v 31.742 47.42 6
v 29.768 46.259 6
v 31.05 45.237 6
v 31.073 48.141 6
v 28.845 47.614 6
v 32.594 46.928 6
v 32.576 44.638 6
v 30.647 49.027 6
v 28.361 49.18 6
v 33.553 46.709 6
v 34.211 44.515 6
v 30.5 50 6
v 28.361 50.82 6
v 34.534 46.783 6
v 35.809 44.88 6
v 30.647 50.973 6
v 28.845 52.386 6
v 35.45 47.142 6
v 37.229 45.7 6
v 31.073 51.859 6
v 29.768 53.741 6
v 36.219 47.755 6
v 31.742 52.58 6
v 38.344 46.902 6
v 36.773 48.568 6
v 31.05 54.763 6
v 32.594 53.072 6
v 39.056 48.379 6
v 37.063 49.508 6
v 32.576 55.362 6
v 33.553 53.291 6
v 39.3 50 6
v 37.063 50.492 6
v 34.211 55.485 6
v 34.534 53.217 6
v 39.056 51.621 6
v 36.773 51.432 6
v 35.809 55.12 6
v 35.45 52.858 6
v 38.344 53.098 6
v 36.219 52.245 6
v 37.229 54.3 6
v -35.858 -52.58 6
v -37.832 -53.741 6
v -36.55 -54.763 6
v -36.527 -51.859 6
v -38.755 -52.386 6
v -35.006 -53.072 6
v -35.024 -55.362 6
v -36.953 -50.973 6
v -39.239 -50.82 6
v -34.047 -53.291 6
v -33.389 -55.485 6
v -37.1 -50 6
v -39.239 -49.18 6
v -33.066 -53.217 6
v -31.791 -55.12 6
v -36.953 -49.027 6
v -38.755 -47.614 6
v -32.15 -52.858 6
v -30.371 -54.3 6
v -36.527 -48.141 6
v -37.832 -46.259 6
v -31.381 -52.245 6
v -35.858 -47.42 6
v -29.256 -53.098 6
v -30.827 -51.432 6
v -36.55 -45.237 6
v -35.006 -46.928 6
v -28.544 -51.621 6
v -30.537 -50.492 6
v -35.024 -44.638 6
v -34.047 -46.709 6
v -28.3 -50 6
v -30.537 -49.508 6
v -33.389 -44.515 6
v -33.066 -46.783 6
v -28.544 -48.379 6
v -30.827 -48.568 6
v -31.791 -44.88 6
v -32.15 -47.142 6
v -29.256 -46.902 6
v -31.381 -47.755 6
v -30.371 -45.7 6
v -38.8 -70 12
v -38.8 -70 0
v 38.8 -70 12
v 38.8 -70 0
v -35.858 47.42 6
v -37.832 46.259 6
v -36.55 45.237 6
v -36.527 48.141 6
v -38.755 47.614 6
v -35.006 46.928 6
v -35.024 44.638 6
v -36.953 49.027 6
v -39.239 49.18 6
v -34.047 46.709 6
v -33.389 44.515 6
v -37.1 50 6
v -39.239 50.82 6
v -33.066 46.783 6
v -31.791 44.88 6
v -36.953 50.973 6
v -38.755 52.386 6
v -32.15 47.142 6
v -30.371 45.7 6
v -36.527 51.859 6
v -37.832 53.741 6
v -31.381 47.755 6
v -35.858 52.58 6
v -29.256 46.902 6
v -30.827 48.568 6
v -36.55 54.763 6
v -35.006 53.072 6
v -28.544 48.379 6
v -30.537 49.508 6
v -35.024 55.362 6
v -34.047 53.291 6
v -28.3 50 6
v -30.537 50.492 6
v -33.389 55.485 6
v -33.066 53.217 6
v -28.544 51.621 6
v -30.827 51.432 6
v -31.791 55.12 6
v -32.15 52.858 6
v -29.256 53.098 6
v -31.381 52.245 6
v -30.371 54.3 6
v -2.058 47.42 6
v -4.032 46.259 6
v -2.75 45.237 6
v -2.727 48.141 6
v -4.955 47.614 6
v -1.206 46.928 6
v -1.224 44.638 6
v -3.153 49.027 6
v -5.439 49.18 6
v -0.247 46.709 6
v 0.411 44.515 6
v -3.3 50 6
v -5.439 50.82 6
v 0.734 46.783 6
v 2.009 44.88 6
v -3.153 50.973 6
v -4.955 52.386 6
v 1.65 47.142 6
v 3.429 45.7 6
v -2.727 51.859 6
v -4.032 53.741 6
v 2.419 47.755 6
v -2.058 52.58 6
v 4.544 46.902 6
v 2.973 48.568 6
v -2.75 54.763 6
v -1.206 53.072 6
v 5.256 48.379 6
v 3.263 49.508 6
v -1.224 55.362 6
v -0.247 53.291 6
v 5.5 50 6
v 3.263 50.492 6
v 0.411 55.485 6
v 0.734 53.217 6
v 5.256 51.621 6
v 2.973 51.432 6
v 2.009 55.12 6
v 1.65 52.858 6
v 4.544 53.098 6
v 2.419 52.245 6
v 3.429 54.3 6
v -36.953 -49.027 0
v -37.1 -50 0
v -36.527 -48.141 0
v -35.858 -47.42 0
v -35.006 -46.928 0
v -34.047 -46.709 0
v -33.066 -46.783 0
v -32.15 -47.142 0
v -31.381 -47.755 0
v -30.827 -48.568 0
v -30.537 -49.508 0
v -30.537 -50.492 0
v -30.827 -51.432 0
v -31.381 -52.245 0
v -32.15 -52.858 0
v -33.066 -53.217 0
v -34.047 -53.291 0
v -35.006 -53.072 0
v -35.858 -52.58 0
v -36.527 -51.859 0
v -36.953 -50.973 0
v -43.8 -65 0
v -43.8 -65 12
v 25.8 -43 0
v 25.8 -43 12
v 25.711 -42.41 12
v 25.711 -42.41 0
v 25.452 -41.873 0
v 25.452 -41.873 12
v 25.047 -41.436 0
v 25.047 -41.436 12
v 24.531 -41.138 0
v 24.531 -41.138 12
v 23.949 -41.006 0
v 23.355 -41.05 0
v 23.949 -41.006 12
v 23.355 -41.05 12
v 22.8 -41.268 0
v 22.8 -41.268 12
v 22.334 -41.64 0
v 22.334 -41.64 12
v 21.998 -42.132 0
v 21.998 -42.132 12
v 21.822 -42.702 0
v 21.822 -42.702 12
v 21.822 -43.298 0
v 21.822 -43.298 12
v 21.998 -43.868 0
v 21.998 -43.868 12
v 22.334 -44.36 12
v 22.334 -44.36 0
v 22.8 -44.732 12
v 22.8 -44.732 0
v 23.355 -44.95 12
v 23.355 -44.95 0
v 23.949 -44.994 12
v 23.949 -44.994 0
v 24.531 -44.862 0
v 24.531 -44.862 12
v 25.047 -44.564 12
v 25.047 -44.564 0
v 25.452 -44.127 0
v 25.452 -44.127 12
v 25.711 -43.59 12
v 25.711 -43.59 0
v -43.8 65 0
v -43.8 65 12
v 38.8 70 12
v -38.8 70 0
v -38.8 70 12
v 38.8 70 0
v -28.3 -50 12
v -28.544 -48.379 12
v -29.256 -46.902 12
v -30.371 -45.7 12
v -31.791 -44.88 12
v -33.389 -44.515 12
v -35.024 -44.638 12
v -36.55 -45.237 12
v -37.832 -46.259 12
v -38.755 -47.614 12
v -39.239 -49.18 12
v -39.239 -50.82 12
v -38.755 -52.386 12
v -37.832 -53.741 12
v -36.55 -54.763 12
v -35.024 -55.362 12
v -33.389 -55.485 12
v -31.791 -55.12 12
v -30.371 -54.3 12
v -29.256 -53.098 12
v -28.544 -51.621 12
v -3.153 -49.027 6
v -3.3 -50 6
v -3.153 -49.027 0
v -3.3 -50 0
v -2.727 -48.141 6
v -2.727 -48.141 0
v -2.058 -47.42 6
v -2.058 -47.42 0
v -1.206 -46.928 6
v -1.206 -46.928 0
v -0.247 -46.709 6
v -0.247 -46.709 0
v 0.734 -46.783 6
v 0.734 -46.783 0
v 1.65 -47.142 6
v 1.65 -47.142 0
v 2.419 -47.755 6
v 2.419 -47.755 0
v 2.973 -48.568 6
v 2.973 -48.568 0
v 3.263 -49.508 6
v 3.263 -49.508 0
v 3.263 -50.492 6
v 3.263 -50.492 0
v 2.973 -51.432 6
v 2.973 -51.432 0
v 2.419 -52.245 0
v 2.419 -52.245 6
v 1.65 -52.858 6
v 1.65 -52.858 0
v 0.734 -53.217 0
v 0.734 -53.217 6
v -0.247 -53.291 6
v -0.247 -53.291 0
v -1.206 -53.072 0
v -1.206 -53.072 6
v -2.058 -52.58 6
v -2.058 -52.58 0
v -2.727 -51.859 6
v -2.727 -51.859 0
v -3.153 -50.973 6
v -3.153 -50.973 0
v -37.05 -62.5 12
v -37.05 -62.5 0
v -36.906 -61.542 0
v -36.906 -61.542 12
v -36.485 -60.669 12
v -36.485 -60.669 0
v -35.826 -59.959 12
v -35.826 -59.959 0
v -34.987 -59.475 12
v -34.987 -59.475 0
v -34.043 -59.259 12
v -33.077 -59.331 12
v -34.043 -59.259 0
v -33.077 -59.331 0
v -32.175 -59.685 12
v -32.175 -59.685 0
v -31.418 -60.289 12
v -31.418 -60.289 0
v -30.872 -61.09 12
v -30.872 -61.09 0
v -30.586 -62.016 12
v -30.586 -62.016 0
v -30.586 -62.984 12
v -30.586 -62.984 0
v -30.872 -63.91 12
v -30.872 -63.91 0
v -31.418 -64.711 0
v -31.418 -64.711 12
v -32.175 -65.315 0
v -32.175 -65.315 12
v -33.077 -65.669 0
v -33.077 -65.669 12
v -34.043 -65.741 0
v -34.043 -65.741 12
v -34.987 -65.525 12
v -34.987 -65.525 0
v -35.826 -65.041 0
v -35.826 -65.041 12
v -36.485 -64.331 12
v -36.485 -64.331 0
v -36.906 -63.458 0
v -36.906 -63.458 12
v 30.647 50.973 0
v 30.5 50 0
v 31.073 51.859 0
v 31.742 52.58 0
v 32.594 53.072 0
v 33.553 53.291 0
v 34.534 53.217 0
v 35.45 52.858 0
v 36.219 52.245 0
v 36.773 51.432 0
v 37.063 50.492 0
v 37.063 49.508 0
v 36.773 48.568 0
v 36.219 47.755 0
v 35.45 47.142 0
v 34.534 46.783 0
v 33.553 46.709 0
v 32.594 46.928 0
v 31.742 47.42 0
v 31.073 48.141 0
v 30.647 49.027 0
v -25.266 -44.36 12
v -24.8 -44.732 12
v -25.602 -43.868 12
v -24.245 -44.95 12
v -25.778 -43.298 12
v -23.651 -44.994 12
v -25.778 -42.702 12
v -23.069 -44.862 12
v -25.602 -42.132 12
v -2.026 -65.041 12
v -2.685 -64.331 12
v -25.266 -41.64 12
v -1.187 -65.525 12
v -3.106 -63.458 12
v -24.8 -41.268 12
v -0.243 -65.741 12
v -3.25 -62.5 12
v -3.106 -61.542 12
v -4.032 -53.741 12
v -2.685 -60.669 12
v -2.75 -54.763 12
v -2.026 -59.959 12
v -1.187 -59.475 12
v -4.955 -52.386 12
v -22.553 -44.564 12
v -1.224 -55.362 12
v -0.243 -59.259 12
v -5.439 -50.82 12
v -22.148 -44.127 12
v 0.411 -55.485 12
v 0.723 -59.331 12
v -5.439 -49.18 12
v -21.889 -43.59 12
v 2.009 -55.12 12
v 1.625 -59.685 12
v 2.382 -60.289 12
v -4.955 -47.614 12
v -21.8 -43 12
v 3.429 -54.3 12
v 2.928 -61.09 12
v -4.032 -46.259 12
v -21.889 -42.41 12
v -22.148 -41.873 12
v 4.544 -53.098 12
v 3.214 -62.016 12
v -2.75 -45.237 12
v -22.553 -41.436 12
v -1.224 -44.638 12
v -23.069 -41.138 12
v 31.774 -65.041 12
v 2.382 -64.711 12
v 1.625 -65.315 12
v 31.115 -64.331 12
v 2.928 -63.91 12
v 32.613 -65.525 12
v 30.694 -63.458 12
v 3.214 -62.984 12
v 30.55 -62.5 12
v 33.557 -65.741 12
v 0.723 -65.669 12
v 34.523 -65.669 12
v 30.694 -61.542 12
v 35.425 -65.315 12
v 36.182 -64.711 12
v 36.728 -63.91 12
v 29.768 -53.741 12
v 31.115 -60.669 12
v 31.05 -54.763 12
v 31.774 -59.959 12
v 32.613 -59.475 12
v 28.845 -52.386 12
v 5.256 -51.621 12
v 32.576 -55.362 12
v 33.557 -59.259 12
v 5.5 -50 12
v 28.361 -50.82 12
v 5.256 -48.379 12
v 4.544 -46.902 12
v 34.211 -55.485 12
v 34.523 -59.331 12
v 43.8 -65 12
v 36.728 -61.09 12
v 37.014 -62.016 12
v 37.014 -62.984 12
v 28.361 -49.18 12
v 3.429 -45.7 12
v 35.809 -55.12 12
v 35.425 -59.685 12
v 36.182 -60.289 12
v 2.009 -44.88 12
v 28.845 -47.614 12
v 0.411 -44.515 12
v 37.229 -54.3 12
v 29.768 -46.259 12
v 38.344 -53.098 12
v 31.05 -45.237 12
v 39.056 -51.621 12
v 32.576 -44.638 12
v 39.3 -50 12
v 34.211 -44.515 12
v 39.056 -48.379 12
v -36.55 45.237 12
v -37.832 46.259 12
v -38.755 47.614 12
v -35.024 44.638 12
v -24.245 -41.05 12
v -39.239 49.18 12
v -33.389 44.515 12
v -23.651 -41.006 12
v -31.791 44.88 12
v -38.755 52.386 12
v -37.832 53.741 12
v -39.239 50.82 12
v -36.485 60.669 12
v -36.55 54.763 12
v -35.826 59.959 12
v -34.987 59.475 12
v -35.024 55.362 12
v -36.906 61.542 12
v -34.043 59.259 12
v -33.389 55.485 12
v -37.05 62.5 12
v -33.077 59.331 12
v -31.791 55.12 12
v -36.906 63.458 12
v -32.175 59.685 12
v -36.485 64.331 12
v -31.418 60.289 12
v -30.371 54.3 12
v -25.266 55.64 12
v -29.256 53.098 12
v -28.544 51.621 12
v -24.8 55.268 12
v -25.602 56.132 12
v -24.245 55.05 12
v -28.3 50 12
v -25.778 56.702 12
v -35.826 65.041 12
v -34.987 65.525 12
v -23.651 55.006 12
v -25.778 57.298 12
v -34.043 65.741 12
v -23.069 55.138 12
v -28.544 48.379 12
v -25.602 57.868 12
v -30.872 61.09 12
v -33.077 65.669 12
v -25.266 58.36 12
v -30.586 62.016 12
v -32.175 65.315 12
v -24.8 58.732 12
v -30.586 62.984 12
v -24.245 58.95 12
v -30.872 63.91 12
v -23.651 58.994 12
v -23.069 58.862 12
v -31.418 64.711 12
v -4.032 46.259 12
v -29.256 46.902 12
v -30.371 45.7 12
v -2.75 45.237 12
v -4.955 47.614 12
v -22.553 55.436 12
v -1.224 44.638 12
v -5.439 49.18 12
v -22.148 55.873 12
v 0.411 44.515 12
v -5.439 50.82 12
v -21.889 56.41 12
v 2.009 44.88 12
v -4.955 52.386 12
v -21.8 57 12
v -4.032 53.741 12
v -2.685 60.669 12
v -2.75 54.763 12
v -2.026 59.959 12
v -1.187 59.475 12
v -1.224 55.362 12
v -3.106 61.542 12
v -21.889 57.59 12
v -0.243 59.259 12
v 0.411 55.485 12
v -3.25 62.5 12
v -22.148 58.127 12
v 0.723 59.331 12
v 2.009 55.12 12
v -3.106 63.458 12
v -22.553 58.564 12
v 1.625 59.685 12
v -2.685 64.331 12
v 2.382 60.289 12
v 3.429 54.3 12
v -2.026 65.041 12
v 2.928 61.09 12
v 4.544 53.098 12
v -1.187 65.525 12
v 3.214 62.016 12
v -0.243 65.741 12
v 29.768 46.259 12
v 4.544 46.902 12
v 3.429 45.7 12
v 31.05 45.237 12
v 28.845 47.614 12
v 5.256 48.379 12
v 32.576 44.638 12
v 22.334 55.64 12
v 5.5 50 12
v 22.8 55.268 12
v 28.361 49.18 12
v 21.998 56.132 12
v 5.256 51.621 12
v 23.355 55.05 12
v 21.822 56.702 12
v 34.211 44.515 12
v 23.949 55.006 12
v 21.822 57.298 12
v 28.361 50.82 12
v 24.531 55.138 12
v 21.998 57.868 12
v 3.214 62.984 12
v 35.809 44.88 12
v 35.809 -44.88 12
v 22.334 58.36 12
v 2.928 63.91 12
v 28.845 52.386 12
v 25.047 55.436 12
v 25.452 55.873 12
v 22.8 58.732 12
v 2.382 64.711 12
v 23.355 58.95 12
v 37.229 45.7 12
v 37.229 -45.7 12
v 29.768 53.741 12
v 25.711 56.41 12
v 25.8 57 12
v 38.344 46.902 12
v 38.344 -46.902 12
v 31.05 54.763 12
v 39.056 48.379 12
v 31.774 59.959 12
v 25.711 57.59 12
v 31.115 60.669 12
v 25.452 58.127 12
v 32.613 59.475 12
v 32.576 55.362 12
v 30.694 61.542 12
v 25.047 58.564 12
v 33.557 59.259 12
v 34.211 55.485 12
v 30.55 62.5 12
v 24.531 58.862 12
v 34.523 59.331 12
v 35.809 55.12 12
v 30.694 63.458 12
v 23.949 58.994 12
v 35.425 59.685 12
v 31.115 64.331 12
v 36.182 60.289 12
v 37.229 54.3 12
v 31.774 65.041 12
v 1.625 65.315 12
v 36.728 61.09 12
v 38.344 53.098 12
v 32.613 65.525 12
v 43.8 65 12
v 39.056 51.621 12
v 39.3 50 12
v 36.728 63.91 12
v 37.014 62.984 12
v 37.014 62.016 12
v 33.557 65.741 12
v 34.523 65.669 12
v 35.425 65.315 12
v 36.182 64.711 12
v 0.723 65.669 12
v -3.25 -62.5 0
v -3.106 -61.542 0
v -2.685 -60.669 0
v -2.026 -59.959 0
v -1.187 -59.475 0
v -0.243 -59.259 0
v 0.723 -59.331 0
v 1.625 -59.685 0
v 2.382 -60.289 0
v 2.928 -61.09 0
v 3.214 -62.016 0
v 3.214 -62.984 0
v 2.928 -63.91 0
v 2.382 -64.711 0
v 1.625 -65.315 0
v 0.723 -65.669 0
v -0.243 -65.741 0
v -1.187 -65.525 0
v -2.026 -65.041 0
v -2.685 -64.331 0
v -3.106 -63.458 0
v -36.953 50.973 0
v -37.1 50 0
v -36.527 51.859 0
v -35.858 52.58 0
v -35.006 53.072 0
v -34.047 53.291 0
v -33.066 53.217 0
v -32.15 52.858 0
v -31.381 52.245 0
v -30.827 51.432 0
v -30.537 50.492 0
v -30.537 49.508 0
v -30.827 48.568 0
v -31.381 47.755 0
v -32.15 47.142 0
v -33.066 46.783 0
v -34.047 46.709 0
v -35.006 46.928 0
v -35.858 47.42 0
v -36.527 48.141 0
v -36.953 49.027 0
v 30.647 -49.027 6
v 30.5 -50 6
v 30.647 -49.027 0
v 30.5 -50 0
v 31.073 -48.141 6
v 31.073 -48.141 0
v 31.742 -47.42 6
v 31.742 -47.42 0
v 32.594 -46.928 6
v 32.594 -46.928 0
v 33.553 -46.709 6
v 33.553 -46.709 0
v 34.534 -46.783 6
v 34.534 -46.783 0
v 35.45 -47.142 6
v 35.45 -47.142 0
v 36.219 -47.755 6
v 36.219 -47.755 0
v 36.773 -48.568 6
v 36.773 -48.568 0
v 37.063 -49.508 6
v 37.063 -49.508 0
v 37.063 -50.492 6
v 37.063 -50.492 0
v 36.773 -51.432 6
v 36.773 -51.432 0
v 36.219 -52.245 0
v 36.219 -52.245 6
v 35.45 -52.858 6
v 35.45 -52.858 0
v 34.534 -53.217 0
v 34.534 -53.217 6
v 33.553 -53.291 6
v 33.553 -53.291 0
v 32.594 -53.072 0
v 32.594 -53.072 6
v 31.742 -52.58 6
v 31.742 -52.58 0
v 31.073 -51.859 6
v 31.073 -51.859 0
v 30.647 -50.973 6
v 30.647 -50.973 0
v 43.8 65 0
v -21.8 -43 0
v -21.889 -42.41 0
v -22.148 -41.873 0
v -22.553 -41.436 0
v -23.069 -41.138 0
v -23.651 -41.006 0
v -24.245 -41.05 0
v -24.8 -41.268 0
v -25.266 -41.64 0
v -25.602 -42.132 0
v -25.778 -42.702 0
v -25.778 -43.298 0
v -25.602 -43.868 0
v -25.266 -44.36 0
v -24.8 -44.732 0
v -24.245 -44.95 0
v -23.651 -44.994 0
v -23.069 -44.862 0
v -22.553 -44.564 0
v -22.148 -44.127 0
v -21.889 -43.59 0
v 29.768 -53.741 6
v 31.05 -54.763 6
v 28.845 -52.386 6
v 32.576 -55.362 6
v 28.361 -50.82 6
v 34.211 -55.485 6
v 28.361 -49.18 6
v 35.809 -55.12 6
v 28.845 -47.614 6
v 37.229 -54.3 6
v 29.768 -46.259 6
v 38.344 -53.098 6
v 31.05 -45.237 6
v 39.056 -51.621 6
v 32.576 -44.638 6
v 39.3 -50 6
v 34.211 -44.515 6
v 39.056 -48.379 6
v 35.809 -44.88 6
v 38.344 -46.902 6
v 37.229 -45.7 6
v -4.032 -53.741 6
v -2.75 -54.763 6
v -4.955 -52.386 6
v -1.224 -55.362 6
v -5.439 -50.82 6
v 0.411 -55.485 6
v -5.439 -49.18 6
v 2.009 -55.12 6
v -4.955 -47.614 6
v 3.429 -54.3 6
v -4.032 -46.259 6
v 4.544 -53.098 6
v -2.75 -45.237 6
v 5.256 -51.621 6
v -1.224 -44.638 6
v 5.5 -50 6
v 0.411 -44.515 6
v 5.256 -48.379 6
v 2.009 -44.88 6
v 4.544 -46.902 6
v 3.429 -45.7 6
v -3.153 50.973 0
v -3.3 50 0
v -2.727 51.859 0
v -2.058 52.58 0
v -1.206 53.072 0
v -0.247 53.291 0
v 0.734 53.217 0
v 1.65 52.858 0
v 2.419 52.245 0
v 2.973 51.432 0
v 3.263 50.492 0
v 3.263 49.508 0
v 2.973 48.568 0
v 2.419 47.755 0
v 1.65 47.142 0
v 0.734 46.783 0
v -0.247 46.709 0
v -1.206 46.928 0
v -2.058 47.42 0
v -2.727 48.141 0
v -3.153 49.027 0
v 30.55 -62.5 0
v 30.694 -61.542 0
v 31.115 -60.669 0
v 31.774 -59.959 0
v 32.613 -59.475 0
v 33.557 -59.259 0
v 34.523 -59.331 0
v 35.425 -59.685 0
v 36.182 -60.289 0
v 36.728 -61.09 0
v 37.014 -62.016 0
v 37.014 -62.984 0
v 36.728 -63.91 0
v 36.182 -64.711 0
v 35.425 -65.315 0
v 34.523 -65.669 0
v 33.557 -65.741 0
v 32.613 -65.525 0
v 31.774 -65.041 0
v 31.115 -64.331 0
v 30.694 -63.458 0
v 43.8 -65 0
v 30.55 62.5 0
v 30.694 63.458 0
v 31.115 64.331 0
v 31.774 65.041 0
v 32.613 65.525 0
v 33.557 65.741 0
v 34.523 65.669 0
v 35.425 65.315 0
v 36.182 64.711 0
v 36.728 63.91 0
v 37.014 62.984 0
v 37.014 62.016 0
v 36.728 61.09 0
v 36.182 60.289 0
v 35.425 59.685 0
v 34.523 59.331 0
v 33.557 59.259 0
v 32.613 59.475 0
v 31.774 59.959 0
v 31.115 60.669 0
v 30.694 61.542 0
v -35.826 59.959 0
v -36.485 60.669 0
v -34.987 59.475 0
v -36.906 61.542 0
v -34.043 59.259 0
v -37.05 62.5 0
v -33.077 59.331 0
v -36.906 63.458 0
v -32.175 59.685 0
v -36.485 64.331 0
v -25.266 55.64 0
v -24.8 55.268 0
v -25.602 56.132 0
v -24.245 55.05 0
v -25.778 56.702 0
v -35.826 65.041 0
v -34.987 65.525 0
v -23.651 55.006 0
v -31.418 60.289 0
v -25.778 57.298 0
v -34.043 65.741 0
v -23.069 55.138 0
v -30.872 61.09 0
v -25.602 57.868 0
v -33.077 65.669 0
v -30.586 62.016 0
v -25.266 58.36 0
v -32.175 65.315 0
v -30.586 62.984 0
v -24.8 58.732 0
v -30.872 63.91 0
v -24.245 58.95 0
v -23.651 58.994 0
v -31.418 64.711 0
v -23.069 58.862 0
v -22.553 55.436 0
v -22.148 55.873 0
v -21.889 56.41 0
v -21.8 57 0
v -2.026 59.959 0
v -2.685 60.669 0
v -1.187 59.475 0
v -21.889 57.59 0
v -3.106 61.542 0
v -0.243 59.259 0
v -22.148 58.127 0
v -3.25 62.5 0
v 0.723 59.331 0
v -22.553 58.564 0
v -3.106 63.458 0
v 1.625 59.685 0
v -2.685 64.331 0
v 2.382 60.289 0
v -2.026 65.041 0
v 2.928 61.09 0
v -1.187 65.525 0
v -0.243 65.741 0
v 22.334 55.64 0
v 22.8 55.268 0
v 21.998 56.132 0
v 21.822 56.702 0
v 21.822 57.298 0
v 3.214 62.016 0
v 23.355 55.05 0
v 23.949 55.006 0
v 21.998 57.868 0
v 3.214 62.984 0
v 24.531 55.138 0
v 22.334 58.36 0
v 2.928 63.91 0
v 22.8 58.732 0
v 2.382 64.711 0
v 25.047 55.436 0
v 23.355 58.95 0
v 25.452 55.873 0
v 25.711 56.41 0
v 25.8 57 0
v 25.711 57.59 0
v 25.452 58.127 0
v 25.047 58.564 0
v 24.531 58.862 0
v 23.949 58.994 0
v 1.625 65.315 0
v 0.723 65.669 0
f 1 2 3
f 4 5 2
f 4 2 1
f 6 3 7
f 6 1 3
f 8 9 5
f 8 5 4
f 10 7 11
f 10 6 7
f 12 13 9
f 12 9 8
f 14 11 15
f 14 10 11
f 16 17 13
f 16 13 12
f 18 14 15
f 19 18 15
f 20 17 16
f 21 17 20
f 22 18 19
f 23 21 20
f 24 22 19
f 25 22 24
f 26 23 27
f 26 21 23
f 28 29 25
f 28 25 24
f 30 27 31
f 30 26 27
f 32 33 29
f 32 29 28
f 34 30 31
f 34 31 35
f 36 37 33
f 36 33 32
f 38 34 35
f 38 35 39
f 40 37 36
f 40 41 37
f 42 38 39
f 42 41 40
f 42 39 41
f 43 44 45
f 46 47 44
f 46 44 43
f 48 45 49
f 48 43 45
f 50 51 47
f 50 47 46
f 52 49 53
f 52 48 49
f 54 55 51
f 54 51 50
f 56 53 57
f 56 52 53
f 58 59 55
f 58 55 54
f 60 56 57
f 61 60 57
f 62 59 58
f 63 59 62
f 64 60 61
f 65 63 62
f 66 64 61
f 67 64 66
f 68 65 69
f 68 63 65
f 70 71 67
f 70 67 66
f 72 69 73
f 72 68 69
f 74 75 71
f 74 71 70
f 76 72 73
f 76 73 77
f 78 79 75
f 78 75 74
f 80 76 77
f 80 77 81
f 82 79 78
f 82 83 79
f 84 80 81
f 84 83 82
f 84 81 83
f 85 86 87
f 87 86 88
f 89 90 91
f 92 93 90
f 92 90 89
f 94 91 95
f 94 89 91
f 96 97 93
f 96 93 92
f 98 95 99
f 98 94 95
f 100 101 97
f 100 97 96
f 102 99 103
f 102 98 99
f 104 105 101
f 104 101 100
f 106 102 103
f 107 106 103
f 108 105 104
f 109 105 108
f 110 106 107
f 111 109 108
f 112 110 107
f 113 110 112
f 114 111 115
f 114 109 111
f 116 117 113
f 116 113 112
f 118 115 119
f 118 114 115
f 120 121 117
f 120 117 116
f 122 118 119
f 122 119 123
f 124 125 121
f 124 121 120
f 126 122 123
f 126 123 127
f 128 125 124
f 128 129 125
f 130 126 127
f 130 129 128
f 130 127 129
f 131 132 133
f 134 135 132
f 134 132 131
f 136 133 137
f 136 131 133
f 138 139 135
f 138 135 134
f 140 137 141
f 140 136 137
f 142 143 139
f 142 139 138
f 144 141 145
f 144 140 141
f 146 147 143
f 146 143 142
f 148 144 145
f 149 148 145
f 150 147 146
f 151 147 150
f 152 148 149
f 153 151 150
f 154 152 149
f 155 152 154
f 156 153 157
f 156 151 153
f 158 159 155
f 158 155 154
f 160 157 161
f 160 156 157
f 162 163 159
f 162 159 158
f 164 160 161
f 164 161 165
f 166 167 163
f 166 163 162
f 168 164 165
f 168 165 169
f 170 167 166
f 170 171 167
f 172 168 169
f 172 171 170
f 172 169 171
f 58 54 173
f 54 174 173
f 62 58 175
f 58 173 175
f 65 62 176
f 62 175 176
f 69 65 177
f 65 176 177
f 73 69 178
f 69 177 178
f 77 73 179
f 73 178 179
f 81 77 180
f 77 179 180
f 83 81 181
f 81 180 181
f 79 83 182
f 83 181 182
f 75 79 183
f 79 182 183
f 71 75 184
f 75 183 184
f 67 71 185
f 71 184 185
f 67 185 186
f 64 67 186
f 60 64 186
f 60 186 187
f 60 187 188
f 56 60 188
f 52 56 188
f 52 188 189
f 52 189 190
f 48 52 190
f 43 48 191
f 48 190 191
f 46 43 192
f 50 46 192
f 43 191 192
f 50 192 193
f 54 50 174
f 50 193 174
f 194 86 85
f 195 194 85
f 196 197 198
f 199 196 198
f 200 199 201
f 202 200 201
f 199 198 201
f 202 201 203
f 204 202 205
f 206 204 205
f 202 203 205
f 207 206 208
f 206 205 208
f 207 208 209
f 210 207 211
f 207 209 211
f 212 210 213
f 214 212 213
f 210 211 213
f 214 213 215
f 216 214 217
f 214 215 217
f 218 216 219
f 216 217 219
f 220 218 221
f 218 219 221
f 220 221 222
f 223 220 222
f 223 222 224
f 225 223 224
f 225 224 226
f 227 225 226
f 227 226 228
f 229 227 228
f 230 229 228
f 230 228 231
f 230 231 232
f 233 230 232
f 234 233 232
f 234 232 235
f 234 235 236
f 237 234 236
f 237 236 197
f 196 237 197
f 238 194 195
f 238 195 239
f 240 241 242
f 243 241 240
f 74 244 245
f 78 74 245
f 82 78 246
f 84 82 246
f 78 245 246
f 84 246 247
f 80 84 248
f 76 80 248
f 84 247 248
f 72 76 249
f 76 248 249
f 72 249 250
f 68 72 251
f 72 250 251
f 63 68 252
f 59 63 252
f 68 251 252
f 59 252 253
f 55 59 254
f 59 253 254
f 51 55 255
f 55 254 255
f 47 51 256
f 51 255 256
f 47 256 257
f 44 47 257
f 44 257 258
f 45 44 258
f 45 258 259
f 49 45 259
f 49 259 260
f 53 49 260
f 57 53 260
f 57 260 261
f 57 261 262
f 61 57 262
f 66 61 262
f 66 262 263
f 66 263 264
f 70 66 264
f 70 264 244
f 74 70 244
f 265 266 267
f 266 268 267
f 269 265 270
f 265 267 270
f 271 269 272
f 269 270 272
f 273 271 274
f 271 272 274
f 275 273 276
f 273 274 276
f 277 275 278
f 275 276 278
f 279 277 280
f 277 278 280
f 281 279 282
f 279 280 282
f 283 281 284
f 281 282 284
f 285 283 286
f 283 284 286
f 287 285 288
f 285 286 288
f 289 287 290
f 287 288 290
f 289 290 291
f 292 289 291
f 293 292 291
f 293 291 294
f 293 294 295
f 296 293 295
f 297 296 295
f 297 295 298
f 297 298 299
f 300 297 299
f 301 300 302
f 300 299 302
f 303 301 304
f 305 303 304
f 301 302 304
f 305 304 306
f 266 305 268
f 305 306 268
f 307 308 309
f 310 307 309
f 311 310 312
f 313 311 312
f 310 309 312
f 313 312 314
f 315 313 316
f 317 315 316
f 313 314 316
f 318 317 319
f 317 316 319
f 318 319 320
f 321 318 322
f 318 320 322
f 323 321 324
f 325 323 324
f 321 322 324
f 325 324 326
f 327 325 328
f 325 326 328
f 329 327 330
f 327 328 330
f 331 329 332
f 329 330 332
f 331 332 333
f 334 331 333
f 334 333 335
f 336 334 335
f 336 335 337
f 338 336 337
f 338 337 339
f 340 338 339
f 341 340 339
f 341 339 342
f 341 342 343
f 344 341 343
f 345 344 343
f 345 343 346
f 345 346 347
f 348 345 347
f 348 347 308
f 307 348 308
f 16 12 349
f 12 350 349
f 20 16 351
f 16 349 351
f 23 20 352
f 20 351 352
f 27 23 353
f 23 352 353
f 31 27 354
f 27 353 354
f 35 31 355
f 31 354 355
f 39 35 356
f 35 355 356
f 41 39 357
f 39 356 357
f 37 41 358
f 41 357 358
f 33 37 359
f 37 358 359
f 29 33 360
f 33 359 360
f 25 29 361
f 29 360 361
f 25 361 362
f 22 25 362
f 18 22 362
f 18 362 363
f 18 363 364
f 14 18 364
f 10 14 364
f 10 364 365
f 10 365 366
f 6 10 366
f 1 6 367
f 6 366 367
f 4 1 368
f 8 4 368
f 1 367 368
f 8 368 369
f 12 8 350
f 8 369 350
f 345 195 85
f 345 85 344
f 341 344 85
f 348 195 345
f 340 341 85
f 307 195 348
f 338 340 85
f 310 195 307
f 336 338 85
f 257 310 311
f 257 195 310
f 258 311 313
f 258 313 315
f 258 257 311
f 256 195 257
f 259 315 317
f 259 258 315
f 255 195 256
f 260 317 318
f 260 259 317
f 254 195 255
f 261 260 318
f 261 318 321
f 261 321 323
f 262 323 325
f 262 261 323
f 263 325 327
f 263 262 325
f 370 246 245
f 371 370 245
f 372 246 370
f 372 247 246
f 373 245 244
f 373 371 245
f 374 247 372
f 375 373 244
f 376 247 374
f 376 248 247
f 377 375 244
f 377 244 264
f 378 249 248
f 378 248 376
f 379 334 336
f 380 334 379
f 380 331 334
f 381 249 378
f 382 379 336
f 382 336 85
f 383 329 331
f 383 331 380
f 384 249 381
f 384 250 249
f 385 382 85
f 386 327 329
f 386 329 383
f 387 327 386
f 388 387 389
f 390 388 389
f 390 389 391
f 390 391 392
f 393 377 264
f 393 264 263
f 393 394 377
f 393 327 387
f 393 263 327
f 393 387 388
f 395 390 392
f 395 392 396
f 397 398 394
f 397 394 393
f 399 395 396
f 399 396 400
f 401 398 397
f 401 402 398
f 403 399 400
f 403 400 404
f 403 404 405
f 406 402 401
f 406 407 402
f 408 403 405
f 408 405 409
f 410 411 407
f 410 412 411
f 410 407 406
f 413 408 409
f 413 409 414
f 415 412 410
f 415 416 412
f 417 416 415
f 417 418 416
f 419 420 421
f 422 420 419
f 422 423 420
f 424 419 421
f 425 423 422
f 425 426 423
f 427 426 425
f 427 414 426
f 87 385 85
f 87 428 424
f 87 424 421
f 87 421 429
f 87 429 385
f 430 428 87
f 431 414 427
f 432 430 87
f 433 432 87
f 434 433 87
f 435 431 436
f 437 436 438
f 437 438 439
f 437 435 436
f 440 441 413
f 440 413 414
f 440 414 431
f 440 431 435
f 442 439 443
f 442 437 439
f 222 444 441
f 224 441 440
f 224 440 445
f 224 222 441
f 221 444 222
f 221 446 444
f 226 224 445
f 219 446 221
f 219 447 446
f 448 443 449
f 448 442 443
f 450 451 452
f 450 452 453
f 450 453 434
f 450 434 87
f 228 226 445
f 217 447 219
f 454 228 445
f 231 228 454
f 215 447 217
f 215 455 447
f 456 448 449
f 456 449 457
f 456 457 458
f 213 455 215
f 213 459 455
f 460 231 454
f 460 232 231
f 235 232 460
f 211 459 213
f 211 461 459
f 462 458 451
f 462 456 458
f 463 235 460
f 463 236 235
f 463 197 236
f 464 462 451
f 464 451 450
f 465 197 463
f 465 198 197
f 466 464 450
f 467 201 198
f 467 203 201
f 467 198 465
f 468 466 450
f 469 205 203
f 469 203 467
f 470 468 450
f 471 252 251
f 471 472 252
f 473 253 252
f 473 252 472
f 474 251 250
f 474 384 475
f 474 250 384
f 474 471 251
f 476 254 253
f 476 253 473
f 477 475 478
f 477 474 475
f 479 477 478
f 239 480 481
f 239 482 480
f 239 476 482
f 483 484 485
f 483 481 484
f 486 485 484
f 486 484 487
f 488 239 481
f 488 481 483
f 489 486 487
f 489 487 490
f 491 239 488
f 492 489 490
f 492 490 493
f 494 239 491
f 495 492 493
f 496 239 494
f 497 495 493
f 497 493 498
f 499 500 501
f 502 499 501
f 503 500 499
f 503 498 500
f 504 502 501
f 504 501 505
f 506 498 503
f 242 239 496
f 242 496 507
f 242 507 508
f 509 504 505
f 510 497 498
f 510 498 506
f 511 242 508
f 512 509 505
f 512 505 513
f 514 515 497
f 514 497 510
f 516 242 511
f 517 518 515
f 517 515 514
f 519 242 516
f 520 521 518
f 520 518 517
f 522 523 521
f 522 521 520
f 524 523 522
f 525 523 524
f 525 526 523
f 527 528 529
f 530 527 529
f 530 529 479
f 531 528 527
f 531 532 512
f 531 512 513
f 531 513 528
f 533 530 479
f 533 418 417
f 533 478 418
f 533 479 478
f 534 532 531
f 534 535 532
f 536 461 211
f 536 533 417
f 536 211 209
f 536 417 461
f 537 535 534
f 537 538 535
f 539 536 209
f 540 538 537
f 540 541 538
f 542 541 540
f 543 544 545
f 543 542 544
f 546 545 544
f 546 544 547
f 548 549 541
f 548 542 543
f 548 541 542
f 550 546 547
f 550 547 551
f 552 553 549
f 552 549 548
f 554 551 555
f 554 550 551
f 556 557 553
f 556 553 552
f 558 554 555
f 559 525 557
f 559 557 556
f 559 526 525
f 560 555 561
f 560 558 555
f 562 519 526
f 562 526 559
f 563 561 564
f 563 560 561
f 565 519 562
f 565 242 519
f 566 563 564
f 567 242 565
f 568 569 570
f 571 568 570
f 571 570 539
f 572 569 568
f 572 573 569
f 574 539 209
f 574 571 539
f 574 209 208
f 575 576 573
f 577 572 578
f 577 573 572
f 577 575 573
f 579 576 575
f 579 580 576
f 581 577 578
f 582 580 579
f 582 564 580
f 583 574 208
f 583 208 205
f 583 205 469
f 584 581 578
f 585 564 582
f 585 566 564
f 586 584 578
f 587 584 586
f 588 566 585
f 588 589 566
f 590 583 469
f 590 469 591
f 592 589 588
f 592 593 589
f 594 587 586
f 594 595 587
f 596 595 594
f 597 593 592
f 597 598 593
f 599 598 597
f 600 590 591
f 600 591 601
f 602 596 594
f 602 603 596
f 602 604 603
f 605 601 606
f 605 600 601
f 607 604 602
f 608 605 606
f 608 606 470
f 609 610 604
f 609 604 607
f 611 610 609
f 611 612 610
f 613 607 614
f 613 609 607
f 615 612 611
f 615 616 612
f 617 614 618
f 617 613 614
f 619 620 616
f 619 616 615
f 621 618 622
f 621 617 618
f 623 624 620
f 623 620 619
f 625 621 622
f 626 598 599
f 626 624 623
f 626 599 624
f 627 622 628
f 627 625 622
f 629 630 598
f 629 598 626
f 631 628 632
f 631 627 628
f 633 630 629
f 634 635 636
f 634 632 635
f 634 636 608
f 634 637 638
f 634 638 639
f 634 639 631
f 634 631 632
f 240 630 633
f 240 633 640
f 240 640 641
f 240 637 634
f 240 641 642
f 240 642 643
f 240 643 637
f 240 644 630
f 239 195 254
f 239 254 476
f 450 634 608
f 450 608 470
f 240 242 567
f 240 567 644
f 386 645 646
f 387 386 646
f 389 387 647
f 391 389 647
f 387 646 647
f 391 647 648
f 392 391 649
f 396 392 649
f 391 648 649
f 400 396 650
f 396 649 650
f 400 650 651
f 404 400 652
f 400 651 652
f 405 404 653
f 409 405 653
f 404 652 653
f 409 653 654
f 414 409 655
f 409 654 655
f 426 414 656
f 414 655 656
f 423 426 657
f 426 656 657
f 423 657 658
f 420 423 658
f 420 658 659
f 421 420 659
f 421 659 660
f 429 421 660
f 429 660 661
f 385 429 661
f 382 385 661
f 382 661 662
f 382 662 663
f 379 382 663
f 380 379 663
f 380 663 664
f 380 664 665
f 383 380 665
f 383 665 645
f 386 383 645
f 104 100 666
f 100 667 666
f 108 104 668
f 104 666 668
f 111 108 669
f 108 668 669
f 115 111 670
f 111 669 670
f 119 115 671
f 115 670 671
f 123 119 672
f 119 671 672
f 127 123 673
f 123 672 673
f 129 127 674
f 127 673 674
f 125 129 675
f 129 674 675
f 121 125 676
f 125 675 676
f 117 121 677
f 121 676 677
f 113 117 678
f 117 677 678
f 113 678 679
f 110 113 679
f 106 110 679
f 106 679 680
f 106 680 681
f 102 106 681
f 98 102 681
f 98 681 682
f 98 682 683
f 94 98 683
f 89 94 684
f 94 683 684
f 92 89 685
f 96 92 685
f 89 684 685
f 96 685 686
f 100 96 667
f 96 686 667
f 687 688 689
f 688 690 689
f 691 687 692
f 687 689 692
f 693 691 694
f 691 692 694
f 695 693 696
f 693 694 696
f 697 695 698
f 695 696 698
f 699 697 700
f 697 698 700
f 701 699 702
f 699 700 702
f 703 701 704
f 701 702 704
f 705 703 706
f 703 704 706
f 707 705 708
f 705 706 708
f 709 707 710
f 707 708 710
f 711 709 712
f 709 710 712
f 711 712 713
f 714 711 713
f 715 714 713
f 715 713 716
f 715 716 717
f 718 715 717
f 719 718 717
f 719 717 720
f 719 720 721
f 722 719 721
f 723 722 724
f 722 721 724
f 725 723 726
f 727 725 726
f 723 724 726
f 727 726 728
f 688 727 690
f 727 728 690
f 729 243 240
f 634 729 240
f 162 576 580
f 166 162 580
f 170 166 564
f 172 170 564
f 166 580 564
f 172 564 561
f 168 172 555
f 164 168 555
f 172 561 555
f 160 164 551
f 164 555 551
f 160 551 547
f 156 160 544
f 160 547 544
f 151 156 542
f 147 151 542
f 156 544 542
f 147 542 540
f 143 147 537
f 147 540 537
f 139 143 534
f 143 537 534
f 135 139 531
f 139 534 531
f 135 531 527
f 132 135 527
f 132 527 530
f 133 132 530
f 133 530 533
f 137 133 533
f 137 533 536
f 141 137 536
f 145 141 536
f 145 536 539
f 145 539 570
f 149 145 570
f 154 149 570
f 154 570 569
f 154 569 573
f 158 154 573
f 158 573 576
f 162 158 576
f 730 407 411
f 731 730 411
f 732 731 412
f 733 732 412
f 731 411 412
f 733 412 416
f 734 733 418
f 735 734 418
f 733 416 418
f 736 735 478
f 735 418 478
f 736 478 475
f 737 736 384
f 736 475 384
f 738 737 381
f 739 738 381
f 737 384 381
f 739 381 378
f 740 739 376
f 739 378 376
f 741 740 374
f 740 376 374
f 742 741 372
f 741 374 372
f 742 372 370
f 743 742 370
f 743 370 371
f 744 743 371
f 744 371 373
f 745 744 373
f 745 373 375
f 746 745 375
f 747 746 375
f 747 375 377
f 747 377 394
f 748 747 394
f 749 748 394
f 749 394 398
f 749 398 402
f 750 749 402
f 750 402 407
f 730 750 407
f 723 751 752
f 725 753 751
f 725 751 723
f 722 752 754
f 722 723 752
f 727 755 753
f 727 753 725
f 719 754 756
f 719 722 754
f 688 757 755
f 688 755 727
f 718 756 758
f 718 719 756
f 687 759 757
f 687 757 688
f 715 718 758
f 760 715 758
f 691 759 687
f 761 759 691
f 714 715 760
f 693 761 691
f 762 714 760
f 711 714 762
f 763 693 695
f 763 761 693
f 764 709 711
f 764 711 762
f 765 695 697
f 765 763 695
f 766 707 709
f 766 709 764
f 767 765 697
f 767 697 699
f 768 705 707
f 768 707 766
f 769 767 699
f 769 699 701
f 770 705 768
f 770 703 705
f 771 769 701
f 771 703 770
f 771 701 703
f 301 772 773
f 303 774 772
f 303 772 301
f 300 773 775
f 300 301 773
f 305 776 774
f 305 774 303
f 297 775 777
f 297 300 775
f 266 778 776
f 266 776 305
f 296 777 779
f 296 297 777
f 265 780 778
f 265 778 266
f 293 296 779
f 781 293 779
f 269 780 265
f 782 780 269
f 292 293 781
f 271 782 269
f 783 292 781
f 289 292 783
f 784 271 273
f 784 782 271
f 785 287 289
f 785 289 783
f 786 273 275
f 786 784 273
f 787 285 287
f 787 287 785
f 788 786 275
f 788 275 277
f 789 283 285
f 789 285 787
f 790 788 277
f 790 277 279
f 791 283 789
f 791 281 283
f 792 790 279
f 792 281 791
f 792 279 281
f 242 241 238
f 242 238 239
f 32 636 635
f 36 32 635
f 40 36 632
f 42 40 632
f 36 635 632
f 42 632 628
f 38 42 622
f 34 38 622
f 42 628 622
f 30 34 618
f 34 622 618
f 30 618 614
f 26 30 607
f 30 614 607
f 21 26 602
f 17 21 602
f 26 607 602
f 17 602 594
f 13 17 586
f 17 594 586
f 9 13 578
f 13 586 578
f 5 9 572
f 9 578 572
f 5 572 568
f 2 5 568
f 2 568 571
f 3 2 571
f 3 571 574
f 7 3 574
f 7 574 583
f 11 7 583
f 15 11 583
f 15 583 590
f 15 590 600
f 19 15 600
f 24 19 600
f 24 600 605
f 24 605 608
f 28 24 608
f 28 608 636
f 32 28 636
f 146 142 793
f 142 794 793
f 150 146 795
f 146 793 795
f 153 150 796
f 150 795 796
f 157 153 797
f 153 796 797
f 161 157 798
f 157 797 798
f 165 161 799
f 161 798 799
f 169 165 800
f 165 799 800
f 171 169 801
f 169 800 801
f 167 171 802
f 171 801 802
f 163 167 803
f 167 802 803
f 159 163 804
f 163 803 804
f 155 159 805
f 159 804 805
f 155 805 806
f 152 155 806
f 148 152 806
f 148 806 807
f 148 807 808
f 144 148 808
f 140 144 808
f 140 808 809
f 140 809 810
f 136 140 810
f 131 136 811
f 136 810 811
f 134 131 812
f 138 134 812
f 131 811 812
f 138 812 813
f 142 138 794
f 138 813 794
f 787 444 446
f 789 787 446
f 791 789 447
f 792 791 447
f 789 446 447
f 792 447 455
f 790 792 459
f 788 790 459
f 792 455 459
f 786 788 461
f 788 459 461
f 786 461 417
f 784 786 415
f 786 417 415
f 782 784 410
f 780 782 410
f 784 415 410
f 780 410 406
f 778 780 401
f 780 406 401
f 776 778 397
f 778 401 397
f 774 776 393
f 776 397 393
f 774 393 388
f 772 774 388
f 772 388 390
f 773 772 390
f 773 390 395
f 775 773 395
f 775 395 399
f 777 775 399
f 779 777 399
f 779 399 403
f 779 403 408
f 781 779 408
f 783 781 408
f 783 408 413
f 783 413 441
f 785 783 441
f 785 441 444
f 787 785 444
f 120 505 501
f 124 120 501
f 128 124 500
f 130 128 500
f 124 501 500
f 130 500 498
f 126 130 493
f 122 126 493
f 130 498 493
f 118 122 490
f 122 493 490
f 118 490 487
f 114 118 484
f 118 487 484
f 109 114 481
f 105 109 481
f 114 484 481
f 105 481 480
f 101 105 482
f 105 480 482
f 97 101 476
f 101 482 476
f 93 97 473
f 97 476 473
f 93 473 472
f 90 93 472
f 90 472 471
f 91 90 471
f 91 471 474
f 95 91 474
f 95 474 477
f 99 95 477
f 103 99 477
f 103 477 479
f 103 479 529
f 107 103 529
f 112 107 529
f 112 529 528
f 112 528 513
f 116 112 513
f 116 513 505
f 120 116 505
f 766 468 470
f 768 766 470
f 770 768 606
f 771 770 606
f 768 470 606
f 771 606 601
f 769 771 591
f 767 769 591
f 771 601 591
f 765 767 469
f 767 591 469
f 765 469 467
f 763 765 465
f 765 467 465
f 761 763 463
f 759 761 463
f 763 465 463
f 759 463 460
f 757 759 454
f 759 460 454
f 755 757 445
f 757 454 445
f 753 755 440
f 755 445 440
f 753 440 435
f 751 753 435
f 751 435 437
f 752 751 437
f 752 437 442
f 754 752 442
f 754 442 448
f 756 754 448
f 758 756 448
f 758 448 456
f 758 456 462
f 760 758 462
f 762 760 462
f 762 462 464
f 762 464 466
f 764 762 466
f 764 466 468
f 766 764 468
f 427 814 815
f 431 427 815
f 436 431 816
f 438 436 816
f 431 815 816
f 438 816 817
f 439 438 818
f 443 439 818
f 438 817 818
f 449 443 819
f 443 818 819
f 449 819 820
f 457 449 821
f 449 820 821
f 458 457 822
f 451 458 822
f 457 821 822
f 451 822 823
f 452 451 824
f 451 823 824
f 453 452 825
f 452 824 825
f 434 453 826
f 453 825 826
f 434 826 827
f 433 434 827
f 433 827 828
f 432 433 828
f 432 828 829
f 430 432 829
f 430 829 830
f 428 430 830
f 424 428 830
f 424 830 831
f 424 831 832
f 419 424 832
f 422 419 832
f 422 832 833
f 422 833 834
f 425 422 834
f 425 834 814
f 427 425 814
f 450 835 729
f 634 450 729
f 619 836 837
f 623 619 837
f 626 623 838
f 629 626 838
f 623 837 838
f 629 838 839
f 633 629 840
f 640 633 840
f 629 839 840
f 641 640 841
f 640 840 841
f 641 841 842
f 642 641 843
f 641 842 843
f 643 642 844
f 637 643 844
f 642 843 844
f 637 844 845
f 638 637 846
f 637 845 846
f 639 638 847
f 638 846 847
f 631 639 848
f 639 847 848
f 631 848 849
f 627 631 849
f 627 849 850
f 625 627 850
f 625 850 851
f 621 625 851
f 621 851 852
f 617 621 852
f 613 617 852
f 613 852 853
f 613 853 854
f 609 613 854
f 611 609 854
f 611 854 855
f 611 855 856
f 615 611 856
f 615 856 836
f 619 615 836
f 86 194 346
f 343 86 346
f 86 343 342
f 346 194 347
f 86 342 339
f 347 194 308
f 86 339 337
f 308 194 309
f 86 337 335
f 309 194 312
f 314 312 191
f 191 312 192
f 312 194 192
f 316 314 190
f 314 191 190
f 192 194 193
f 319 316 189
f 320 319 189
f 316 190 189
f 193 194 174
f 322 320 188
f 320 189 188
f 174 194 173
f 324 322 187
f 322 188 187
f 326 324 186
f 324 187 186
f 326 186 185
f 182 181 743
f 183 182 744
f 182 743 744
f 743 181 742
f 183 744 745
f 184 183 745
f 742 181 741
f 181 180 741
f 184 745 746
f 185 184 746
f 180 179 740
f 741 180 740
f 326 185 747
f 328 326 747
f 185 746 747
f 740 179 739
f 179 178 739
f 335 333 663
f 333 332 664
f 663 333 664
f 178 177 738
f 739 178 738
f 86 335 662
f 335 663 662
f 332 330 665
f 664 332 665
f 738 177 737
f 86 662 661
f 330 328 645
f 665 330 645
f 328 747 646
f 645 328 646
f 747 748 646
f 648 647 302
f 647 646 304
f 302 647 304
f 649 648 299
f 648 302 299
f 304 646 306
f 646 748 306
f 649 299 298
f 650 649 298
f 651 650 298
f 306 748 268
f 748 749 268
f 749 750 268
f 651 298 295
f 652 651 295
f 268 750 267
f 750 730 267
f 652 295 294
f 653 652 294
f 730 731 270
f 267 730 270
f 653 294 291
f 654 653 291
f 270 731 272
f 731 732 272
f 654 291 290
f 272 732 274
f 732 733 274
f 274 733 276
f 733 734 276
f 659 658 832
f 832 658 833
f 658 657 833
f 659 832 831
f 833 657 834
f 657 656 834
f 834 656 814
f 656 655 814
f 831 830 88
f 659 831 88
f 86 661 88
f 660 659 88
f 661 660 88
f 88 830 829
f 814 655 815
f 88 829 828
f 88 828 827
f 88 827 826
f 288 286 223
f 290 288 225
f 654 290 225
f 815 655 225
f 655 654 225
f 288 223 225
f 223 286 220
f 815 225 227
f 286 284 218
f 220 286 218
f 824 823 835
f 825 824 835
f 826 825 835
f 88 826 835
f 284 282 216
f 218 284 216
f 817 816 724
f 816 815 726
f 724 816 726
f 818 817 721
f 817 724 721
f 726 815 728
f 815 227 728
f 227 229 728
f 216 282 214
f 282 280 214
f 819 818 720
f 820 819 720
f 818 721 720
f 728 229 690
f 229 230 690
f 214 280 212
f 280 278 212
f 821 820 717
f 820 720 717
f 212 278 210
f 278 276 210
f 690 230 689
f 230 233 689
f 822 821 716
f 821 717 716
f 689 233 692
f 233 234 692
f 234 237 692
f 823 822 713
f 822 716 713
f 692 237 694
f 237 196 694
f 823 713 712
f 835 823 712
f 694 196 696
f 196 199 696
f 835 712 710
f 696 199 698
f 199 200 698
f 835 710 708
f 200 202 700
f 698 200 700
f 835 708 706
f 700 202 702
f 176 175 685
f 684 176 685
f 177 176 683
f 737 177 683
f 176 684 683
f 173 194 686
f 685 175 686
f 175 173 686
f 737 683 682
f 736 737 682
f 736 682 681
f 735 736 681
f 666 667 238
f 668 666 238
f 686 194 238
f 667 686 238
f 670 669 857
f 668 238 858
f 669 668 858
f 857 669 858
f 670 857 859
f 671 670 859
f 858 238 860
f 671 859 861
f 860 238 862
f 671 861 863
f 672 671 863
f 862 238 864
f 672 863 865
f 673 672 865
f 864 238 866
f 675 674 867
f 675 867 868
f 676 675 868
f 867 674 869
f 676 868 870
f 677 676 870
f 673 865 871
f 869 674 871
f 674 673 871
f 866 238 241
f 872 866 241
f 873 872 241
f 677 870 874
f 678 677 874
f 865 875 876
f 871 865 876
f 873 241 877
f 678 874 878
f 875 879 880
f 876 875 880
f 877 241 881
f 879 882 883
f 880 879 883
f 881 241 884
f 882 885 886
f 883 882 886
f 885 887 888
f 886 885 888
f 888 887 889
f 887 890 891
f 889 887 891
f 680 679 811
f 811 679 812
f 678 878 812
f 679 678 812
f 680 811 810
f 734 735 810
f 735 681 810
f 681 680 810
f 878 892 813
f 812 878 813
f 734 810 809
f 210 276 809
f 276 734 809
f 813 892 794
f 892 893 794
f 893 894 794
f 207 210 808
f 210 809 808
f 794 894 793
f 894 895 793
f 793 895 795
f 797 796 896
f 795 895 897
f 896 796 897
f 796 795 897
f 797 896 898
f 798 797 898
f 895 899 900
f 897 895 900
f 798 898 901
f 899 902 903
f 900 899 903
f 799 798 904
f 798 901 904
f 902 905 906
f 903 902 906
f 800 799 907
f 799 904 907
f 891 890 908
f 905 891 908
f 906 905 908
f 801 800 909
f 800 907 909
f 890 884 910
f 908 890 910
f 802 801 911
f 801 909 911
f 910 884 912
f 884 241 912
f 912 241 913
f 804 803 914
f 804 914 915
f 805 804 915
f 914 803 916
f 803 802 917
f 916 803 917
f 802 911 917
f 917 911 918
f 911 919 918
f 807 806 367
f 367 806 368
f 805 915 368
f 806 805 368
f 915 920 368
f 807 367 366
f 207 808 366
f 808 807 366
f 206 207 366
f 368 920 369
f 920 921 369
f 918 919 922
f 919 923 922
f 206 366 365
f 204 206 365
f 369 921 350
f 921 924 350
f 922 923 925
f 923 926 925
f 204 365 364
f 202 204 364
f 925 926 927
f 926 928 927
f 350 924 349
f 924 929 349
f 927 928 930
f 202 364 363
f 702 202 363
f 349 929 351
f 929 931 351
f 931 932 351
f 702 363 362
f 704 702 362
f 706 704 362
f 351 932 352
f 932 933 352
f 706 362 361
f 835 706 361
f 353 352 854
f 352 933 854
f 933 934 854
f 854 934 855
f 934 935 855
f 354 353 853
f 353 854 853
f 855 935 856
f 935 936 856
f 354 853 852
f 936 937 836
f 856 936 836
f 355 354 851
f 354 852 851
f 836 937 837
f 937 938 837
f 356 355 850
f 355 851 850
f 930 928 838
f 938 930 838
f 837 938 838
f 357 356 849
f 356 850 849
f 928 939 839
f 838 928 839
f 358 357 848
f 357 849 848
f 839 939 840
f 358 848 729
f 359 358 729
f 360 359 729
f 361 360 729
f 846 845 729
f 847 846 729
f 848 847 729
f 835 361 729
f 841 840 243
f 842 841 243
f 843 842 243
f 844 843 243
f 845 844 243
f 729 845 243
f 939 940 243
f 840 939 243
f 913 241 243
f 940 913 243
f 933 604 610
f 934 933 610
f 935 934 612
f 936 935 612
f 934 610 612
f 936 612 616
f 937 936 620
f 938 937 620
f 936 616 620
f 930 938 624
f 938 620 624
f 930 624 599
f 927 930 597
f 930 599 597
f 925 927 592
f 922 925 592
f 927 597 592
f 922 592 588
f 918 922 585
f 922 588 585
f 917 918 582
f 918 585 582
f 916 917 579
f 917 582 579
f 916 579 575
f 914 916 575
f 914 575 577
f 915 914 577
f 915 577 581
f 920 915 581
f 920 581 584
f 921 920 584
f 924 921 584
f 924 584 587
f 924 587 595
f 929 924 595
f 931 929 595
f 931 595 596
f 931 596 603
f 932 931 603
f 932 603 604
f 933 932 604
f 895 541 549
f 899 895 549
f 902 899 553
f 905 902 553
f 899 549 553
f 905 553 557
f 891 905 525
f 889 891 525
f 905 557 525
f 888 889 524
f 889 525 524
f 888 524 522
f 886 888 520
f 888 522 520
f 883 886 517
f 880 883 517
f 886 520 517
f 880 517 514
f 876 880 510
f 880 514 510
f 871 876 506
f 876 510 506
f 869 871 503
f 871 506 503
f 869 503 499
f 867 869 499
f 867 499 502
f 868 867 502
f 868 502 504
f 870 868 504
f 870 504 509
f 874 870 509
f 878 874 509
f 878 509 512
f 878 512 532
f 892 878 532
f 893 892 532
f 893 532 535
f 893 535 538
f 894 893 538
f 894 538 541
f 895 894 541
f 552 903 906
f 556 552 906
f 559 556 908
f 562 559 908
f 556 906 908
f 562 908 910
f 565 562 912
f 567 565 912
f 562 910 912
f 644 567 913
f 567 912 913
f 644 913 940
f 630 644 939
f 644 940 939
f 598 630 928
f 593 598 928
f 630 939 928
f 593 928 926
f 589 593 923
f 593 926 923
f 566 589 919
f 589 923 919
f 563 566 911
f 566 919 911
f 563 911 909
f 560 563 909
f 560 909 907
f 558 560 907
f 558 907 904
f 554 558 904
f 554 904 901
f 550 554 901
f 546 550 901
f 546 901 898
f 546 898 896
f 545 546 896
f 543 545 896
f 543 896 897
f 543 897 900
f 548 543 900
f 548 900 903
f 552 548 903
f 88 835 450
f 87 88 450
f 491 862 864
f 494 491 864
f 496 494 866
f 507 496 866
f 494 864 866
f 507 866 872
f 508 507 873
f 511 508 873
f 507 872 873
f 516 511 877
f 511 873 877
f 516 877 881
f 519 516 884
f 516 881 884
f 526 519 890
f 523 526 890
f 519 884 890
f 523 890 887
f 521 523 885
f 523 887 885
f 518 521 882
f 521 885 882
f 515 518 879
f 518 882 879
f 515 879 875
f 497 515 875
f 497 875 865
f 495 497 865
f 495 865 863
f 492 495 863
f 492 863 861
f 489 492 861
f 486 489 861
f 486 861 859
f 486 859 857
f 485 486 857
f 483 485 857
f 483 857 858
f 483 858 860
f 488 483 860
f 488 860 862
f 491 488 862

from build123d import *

# Parameters (mm, degrees)
SKETCH_1_W                   = 87.6
SKETCH_1_H                   = 140
EXTRUDE_1_DEPTH              = 12
CHAMFER_1_SIZE               = 5
HOLE_WIZARD_M6_1_D           = 6.6
HOLE_WIZARD_M6_1_CBORE_D     = 11
HOLE_WIZARD_M6_1_CBORE_DEPTH = 6
SKETCH_4_R                   = 2
CUT_EXTRUDE_1_DEPTH          = 84.441236808
SKETCH_5_R                   = 3.25
CUT_EXTRUDE_2_DEPTH          = 84.441236808


with BuildPart() as part:
    # 草图1 → 凸台-拉伸1 (new body)
    with BuildSketch(Plane.XY):
        Rectangle(SKETCH_1_W, SKETCH_1_H)
    extrude(amount=EXTRUDE_1_DEPTH)

    # 倒角1
    chamfer_1_edges = [part.edges().sort_by_distance(p)[0] for p in [
        (43.8, -70, 6),
        (-43.8, -70, 6),
        (-43.8, 70, 6),
        (43.8, 70, 6),
    ]]
    chamfer(chamfer_1_edges, length=CHAMFER_1_SIZE)

    # M6 六角凹头螺钉的柱形沉头孔1 (through all)
    with Locations(Plane.XY.offset(12)):
        with Locations((33.8, 50), (0, 50), (-33.8, 50), (-33.8, -50), (0, -50), (33.8, -50)):
            CounterBoreHole(HOLE_WIZARD_M6_1_D / 2, HOLE_WIZARD_M6_1_CBORE_D / 2, HOLE_WIZARD_M6_1_CBORE_DEPTH)

    # 草图4 → 切除-拉伸1 (cut, through all)
    with BuildSketch(Plane.XY.offset(12)):
        with Locations((-23.8, 57)):
            Circle(SKETCH_4_R)
        with Locations((23.8, 57)):
            Circle(SKETCH_4_R)
        with Locations((23.8, -43)):
            Circle(SKETCH_4_R)
        with Locations((-23.8, -43)):
            Circle(SKETCH_4_R)
    extrude(amount=-CUT_EXTRUDE_1_DEPTH, mode=Mode.SUBTRACT)

    # 草图5 → 切除-拉伸2 (cut, through all)
    with BuildSketch(Plane(origin=(0, 0, 0), x_dir=(-1, 0, 0), z_dir=(0, 0, -1))):
        with Locations((33.8, 62.5)):
            Circle(SKETCH_5_R)
        with Locations((0, 62.5)):
            Circle(SKETCH_5_R)
        with Locations((-33.8, 62.5)):
            Circle(SKETCH_5_R)
        with Locations((33.8, -62.5)):
            Circle(SKETCH_5_R)
        with Locations((0, -62.5)):
            Circle(SKETCH_5_R)
        with Locations((-33.8, -62.5)):
            Circle(SKETCH_5_R)
    extrude(amount=-CUT_EXTRUDE_2_DEPTH, mode=Mode.SUBTRACT)


solid = part.part
